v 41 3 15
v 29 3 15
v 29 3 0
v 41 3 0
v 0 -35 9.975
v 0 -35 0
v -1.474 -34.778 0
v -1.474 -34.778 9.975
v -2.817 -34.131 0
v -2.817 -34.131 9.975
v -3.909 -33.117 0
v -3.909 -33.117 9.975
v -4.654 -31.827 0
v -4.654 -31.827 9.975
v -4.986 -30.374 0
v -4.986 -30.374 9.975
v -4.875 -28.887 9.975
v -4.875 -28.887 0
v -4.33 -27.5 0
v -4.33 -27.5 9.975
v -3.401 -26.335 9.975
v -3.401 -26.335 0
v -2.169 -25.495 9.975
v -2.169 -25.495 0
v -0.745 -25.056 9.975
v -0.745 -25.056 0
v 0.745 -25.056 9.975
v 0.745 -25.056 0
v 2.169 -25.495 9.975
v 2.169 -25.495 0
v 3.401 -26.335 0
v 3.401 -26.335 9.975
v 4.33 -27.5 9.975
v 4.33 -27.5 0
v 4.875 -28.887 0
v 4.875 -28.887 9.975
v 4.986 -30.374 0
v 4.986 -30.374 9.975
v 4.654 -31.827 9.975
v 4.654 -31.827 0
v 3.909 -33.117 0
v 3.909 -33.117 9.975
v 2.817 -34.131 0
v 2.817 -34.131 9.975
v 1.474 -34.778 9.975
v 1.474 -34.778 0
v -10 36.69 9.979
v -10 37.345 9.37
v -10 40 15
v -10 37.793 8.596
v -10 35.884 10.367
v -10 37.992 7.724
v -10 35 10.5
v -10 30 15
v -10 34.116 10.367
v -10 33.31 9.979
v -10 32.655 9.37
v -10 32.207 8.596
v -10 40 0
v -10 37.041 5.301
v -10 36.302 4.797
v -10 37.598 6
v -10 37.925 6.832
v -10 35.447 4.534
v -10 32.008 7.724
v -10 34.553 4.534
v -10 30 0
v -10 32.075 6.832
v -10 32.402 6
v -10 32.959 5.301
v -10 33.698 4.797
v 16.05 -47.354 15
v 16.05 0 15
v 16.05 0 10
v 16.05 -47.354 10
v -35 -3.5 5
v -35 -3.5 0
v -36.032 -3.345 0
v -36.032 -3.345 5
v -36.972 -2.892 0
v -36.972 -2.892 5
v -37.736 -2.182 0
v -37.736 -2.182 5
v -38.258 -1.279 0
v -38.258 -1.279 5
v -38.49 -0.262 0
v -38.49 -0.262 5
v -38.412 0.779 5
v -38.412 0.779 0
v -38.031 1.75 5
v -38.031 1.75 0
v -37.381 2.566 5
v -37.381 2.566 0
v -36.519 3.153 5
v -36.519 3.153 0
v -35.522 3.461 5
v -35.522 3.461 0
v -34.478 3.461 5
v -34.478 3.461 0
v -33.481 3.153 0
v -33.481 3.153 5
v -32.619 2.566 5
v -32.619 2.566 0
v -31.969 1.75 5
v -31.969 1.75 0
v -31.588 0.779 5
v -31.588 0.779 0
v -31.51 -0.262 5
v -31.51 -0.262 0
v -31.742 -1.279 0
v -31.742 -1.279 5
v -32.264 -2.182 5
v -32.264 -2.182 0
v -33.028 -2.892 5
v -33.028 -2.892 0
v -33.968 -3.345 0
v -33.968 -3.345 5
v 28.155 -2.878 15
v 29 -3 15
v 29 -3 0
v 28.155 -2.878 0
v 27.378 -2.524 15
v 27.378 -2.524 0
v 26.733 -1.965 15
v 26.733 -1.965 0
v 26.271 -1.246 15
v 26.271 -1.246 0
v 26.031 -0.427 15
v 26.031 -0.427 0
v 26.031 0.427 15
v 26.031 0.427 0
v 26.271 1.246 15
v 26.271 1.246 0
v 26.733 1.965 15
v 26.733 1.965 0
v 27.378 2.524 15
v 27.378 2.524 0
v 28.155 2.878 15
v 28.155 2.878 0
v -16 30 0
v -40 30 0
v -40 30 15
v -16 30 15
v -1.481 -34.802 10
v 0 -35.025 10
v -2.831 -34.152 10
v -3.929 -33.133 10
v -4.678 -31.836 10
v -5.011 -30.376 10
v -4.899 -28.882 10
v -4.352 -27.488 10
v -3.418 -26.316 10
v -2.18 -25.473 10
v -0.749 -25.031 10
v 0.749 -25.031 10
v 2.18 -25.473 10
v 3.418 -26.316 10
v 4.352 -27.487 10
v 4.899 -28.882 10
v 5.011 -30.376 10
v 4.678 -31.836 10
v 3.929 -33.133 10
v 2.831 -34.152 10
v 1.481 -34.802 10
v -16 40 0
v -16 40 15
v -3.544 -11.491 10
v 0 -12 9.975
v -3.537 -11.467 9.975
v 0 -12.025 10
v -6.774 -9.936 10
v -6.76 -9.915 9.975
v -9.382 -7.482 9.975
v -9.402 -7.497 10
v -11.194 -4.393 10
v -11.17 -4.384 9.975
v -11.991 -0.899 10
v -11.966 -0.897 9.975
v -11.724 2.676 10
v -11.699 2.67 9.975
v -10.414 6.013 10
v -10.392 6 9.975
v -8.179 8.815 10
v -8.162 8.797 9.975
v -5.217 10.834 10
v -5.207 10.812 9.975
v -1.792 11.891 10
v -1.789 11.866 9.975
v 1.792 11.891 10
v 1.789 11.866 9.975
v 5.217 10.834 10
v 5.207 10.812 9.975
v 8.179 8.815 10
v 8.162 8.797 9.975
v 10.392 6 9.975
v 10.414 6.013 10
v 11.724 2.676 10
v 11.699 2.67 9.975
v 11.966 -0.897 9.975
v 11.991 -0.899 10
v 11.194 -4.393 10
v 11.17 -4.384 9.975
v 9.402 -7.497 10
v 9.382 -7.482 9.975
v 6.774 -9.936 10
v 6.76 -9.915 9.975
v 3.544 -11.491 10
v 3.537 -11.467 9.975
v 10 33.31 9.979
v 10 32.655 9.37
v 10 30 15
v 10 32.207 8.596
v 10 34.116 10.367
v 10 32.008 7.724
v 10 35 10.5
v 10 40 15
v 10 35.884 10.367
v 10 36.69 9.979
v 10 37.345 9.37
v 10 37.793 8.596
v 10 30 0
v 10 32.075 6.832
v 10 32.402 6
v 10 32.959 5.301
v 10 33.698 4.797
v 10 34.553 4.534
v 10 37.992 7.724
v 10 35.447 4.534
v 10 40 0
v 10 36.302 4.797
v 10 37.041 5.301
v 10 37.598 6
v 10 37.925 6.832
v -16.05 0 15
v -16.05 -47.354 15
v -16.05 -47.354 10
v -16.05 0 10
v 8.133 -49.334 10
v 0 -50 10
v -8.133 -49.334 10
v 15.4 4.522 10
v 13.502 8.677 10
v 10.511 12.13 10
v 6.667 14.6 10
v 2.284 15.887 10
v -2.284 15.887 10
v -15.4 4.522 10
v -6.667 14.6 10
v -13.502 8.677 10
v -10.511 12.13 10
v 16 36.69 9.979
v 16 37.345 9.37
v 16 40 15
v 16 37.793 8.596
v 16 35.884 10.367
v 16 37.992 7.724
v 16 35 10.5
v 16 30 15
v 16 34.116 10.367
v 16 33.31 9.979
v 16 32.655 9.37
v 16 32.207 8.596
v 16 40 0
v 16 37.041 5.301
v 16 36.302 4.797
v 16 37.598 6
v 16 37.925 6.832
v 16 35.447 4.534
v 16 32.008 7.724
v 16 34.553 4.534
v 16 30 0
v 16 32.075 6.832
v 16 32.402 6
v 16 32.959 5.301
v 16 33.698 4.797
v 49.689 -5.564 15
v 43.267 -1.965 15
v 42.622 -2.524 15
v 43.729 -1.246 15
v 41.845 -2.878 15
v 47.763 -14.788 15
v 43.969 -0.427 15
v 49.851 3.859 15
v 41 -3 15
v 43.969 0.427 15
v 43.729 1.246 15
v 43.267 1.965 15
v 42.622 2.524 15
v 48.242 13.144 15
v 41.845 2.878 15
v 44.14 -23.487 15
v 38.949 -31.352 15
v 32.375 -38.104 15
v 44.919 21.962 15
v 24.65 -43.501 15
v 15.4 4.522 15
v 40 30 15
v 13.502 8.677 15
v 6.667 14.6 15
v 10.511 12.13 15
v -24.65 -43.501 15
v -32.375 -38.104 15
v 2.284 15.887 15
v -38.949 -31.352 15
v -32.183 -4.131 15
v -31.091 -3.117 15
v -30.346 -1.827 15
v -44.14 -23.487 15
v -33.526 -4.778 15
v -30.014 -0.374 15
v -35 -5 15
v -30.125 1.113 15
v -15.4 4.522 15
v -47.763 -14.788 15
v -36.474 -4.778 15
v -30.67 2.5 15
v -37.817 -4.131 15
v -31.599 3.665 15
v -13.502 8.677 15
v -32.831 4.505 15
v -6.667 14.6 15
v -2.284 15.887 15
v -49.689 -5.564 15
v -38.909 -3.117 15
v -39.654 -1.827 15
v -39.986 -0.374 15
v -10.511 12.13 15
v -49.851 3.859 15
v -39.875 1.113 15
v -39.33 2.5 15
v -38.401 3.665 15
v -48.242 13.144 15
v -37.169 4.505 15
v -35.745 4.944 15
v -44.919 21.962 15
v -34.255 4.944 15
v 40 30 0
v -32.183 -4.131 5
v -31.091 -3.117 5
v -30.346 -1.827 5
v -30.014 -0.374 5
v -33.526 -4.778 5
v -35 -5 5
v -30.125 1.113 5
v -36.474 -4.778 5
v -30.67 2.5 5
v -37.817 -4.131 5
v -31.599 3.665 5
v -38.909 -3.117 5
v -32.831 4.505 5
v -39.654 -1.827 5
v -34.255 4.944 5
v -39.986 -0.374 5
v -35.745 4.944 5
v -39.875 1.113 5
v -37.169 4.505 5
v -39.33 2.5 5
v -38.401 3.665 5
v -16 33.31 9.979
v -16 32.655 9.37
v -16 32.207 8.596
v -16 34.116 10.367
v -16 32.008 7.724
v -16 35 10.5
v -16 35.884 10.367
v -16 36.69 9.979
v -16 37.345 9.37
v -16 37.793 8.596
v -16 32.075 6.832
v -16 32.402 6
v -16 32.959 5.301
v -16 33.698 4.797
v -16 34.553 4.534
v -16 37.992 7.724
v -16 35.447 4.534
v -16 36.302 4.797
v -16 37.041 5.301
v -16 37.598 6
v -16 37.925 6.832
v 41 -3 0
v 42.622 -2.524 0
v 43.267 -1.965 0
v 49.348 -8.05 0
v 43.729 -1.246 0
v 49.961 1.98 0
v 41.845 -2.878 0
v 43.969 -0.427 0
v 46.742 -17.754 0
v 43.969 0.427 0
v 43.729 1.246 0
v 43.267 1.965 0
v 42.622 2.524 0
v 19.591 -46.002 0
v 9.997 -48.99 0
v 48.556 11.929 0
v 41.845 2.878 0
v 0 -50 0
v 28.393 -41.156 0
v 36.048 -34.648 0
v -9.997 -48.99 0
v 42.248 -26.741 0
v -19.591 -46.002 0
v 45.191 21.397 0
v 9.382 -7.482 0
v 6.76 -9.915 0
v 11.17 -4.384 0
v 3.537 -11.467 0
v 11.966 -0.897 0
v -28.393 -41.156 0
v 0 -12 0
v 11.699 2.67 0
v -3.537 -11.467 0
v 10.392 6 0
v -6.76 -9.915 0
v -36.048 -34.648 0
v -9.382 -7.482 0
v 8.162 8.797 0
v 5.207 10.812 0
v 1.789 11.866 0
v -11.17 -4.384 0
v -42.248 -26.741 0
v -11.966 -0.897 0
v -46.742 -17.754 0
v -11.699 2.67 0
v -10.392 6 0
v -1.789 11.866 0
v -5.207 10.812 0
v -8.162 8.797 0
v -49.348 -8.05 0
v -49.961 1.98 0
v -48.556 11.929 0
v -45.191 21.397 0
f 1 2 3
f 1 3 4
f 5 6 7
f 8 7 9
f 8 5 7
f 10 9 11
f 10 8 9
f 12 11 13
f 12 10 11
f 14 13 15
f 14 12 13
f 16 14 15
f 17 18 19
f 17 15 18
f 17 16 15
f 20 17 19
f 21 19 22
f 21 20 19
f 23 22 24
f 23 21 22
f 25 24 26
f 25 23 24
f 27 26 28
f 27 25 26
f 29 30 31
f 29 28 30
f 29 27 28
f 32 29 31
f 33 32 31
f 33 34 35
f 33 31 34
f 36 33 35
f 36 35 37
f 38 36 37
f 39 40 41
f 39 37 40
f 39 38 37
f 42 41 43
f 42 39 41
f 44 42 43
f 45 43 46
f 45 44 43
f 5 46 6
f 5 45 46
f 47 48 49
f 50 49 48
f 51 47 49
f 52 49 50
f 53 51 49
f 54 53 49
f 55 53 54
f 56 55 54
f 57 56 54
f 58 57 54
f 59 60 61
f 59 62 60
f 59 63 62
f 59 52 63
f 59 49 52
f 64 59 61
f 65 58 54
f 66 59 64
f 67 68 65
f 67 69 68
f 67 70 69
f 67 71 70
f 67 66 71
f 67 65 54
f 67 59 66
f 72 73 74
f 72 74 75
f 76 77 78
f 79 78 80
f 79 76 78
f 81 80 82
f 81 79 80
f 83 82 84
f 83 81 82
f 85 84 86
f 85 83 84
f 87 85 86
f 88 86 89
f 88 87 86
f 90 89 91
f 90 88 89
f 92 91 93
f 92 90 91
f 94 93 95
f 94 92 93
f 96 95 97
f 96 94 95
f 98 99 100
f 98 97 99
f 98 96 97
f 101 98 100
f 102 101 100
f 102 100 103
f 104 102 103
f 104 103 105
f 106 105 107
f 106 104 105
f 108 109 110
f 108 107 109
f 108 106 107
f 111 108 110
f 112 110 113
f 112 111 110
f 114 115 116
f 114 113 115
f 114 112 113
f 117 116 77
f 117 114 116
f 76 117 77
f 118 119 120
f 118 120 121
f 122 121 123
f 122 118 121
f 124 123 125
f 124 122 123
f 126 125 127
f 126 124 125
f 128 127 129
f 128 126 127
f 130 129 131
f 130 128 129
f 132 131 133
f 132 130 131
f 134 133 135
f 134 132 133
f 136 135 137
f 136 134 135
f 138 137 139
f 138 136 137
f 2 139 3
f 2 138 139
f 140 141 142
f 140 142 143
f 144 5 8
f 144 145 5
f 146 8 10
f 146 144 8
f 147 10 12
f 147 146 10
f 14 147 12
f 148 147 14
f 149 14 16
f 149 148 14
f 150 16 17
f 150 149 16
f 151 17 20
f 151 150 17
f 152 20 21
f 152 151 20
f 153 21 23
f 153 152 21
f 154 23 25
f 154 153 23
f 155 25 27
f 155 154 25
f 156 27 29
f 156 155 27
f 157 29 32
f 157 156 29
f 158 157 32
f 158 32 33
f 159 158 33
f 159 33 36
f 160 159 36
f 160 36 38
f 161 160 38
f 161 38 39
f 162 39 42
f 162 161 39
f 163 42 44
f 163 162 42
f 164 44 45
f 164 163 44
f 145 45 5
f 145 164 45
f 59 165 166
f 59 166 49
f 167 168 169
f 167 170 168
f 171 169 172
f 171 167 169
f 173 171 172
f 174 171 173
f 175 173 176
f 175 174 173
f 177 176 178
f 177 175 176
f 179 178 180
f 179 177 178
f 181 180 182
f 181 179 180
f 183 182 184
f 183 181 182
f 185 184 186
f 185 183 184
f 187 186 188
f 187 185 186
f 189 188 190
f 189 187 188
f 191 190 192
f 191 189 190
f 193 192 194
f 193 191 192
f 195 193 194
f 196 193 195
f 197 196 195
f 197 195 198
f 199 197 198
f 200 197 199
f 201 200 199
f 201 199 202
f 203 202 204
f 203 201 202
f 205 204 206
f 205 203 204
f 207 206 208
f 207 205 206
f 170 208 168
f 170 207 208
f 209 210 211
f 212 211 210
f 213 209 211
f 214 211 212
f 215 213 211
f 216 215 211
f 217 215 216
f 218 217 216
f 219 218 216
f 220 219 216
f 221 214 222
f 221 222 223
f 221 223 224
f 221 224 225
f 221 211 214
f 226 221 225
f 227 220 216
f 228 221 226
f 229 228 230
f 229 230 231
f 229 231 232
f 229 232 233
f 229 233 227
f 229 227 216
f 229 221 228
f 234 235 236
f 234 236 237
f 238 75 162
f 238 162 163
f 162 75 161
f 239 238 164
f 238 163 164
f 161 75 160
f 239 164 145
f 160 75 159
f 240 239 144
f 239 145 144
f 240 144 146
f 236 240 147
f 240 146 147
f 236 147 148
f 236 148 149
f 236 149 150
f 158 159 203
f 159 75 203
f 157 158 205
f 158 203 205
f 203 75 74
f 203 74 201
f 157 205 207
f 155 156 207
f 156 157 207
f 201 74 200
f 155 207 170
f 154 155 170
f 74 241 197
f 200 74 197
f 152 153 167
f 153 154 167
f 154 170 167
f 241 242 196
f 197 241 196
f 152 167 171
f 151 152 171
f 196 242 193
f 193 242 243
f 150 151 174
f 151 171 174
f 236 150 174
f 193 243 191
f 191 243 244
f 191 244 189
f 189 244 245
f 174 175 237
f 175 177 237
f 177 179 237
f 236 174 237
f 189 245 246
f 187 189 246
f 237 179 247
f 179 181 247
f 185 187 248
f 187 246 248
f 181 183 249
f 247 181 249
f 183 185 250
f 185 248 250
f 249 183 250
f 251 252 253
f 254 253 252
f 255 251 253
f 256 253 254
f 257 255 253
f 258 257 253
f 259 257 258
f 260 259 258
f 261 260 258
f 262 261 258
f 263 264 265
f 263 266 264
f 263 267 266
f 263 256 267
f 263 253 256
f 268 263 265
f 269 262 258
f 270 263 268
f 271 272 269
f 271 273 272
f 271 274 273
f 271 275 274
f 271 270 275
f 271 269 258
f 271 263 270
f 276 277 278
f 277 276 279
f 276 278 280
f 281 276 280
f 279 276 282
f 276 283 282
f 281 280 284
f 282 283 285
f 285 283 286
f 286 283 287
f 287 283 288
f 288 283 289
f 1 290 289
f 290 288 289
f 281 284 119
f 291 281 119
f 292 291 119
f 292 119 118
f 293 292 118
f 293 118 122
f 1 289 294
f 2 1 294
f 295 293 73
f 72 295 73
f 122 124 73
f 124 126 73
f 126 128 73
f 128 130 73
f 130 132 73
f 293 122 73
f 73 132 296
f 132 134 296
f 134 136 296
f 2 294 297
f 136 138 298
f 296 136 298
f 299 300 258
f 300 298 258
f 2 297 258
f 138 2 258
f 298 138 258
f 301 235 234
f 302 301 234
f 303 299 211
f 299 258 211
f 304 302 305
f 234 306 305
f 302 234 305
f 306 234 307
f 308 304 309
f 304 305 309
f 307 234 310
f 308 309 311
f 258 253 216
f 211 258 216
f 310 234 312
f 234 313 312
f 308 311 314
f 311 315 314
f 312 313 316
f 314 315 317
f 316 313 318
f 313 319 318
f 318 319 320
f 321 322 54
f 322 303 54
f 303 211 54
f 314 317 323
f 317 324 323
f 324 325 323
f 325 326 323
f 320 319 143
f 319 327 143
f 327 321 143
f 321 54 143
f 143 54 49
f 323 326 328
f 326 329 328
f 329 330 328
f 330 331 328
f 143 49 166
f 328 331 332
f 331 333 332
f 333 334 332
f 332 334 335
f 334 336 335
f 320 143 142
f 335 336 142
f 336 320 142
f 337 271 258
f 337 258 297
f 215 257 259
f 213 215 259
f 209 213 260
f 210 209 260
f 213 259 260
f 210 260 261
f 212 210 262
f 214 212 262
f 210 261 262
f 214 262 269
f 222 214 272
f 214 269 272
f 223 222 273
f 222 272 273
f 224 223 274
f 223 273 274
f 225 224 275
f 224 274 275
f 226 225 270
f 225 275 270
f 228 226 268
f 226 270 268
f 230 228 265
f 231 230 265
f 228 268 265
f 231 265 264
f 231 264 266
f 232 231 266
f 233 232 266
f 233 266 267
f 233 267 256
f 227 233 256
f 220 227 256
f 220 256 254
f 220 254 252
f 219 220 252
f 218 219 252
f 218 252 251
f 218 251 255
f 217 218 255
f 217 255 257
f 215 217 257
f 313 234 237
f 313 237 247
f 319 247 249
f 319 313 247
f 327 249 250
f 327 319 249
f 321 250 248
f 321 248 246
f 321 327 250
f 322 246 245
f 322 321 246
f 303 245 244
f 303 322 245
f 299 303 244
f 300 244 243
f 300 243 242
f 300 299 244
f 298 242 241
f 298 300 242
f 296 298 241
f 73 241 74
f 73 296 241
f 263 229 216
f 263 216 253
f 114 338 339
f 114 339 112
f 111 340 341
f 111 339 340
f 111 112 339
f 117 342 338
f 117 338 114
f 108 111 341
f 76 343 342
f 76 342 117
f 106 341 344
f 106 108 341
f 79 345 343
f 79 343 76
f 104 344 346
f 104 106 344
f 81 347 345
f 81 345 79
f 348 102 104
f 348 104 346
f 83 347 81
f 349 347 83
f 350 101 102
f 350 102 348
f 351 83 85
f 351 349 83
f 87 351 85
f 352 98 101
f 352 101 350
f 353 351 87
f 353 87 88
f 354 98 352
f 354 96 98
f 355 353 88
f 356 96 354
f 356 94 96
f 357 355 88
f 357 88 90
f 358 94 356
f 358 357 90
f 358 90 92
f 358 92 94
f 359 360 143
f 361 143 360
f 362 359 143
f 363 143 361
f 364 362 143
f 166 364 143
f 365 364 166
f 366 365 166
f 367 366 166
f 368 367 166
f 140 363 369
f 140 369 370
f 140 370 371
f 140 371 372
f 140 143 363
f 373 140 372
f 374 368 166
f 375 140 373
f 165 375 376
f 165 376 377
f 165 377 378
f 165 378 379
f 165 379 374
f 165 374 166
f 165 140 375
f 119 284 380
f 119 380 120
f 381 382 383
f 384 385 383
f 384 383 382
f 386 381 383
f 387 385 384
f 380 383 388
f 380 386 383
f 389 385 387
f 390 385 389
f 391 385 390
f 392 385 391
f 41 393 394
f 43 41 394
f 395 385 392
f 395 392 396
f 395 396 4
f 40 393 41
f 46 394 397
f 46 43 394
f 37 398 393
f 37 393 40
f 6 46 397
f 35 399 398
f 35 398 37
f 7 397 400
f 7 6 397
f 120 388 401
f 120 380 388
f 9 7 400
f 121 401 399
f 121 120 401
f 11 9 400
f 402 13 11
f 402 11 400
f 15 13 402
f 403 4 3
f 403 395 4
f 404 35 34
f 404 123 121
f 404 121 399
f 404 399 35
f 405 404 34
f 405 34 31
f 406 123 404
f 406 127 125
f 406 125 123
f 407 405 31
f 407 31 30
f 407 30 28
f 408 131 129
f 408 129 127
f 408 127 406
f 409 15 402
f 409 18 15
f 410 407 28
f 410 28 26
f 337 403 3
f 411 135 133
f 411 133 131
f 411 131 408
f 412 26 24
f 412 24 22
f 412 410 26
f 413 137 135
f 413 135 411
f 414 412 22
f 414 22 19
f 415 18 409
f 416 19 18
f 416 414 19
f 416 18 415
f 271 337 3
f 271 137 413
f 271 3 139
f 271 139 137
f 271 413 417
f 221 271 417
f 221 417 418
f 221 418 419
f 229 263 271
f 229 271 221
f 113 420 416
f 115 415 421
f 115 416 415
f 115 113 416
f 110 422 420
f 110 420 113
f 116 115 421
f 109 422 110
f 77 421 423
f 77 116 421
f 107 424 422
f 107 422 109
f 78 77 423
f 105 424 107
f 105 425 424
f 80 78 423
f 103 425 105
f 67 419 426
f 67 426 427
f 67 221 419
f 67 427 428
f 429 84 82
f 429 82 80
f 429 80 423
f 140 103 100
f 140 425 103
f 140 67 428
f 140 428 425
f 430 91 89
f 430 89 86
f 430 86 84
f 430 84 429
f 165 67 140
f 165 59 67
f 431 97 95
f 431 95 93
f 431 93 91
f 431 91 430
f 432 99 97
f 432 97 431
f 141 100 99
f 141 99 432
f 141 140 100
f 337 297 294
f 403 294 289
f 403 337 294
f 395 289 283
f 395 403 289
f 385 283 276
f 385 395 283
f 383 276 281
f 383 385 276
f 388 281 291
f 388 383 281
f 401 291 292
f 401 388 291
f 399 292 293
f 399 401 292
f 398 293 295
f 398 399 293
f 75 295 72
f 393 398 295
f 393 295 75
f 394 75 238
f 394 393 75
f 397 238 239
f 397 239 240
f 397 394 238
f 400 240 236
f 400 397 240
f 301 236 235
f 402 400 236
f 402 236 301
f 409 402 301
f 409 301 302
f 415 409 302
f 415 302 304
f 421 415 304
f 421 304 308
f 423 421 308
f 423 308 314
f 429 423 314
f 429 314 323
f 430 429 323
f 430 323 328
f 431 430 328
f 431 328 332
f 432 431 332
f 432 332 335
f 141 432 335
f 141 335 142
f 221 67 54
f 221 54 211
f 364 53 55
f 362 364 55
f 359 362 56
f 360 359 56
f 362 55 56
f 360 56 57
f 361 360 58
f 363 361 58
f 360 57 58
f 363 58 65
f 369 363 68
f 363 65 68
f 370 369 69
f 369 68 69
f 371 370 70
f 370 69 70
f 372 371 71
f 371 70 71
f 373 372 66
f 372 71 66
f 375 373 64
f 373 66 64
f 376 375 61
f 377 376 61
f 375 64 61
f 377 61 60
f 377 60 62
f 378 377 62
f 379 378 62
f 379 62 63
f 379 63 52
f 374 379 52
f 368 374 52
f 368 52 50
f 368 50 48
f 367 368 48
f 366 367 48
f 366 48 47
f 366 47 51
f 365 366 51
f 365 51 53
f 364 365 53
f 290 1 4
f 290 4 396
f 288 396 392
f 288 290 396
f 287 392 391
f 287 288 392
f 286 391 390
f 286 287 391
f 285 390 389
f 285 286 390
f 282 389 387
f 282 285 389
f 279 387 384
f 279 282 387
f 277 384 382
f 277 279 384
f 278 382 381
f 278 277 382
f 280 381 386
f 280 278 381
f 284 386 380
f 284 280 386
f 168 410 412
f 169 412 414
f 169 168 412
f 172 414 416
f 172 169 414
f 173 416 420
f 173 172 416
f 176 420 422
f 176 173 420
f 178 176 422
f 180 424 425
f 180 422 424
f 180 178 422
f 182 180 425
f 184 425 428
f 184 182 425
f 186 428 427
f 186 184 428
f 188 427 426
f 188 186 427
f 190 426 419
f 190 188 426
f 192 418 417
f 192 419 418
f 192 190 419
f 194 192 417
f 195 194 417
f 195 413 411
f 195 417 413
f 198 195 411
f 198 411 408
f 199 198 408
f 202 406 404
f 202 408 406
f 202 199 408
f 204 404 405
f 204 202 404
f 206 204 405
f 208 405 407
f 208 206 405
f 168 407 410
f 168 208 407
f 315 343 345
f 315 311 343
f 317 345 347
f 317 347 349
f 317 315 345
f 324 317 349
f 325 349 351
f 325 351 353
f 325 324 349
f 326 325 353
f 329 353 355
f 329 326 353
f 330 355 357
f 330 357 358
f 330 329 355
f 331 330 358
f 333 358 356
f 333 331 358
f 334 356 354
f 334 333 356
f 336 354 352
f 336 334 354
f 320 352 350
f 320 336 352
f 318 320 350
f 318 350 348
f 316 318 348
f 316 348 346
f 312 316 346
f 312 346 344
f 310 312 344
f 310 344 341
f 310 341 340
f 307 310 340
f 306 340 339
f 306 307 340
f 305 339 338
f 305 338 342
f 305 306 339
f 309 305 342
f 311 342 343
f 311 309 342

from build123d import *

# Parameters (mm, degrees)
ESTRUSIONE_ESTRUSIONE1_DEPTH = 15
TAGLIO_ESTRUSIONE1_DEPTH     = 5
TAGLIO_ESTRUSIONE2_REACH     = 74.284
FORO_6_0_6_1_D               = 6


with BuildPart() as part:
    # Schizzo1 → Estrusione-Estrusione1 (new body)
    with BuildSketch(Plane.XY):
        with BuildLine():
            Line((-40, 30), (-16, 30))
            Line((-16, 30), (-16, 40))
            Line((-16, 40), (-10, 40))
            Line((-10, 40), (-10, 30))
            Line((-10, 30), (10, 30))
            Line((10, 30), (10, 40))
            Line((10, 40), (16, 40))
            Line((16, 40), (16, 30))
            Line((16, 30), (40, 30))
            ThreePointArc((40, 30), (0, -50), (-40, 30))
        make_face()
    extrude(amount=ESTRUSIONE_ESTRUSIONE1_DEPTH)

    # Schizzo2 → Taglio-Estrusione1 (cut)
    with BuildSketch(Plane.XY.offset(15)):
        with BuildLine():
            Line((16.05, 0), (16.05, -60))
            ThreePointArc((16.05, -60), (0, -76.05), (-16.05, -60))
            Line((-16.05, -60), (-16.05, 0))
            ThreePointArc((-16.05, 0), (0, 16.05), (16.05, 0))
        make_face()
    extrude(amount=-TAGLIO_ESTRUSIONE1_DEPTH, mode=Mode.SUBTRACT)

    # Schizzo3 → Taglio-Estrusione2 (cut, up to next)
    with BuildSketch(Plane.XY.offset(15), mode=Mode.PRIVATE) as taglio_estrusione2_sk1:
        with BuildLine():
            Line((29, 3), (41, 3))
            ThreePointArc((41, 3), (44, 0), (41, -3))
            Line((41, -3), (29, -3))
            ThreePointArc((29, -3), (26, 0), (29, 3))
        make_face()
    taglio_estrusione2_tool1 = extrude(taglio_estrusione2_sk1.sketch, amount=-TAGLIO_ESTRUSIONE2_REACH, mode=Mode.PRIVATE) & part.part
    add(taglio_estrusione2_tool1.solids().sort_by_distance((35, 0, 15))[0], mode=Mode.SUBTRACT)

    # Schizzo4 → Foro Ø24.0 (24)-1 (revolve, cut)
    with BuildSketch(Plane(origin=(0, 0, 10), x_dir=(0, -1, 0), z_dir=(1, 0, 0))):
        Polygon((0, 0), (0, 10.001), (12, 10.001), (12, 0.025), (12.025, 0), align=None)
    revolve(axis=Axis((0, 0, 16.35), (0, 0, -1)), mode=Mode.SUBTRACT)

    # Schizzo5 → Foro Ø10.0 (10)-1 (revolve, cut)
    with BuildSketch(Plane(origin=(0, -30, 10), x_dir=(0, -1, 0), z_dir=(1, 0, 0))):
        Polygon((0, 0), (0, 10.001), (5, 10.001), (5, 0.025), (5.025, 0), align=None)
    revolve(axis=Axis((0, -30, 16.35), (0, 0, -1)), mode=Mode.SUBTRACT)

    # Schizzo6 → Foro lamato per Bullone M5 a testa esagonale-1 (revolve, cut)
    with BuildSketch(Plane(origin=(-35, 0, 15), x_dir=(0, -1, 0), z_dir=(1, 0, 0))):
        Polygon((0, 0), (0, 15.001), (3.5, 15.001), (3.5, 10), (5, 10), (5, 0), align=None)
    revolve(axis=Axis((-35, 0, 21.35), (0, 0, -1)), mode=Mode.SUBTRACT)

    # Foro Ø6.0 (6)-1 (through all)
    with Locations(Plane(origin=(-16, 35, 7.5), x_dir=(0, 0, -1), z_dir=(-1, 0, 0))):
        with Locations((0, 0)):
            Hole(FORO_6_0_6_1_D / 2)


solid = part.part
